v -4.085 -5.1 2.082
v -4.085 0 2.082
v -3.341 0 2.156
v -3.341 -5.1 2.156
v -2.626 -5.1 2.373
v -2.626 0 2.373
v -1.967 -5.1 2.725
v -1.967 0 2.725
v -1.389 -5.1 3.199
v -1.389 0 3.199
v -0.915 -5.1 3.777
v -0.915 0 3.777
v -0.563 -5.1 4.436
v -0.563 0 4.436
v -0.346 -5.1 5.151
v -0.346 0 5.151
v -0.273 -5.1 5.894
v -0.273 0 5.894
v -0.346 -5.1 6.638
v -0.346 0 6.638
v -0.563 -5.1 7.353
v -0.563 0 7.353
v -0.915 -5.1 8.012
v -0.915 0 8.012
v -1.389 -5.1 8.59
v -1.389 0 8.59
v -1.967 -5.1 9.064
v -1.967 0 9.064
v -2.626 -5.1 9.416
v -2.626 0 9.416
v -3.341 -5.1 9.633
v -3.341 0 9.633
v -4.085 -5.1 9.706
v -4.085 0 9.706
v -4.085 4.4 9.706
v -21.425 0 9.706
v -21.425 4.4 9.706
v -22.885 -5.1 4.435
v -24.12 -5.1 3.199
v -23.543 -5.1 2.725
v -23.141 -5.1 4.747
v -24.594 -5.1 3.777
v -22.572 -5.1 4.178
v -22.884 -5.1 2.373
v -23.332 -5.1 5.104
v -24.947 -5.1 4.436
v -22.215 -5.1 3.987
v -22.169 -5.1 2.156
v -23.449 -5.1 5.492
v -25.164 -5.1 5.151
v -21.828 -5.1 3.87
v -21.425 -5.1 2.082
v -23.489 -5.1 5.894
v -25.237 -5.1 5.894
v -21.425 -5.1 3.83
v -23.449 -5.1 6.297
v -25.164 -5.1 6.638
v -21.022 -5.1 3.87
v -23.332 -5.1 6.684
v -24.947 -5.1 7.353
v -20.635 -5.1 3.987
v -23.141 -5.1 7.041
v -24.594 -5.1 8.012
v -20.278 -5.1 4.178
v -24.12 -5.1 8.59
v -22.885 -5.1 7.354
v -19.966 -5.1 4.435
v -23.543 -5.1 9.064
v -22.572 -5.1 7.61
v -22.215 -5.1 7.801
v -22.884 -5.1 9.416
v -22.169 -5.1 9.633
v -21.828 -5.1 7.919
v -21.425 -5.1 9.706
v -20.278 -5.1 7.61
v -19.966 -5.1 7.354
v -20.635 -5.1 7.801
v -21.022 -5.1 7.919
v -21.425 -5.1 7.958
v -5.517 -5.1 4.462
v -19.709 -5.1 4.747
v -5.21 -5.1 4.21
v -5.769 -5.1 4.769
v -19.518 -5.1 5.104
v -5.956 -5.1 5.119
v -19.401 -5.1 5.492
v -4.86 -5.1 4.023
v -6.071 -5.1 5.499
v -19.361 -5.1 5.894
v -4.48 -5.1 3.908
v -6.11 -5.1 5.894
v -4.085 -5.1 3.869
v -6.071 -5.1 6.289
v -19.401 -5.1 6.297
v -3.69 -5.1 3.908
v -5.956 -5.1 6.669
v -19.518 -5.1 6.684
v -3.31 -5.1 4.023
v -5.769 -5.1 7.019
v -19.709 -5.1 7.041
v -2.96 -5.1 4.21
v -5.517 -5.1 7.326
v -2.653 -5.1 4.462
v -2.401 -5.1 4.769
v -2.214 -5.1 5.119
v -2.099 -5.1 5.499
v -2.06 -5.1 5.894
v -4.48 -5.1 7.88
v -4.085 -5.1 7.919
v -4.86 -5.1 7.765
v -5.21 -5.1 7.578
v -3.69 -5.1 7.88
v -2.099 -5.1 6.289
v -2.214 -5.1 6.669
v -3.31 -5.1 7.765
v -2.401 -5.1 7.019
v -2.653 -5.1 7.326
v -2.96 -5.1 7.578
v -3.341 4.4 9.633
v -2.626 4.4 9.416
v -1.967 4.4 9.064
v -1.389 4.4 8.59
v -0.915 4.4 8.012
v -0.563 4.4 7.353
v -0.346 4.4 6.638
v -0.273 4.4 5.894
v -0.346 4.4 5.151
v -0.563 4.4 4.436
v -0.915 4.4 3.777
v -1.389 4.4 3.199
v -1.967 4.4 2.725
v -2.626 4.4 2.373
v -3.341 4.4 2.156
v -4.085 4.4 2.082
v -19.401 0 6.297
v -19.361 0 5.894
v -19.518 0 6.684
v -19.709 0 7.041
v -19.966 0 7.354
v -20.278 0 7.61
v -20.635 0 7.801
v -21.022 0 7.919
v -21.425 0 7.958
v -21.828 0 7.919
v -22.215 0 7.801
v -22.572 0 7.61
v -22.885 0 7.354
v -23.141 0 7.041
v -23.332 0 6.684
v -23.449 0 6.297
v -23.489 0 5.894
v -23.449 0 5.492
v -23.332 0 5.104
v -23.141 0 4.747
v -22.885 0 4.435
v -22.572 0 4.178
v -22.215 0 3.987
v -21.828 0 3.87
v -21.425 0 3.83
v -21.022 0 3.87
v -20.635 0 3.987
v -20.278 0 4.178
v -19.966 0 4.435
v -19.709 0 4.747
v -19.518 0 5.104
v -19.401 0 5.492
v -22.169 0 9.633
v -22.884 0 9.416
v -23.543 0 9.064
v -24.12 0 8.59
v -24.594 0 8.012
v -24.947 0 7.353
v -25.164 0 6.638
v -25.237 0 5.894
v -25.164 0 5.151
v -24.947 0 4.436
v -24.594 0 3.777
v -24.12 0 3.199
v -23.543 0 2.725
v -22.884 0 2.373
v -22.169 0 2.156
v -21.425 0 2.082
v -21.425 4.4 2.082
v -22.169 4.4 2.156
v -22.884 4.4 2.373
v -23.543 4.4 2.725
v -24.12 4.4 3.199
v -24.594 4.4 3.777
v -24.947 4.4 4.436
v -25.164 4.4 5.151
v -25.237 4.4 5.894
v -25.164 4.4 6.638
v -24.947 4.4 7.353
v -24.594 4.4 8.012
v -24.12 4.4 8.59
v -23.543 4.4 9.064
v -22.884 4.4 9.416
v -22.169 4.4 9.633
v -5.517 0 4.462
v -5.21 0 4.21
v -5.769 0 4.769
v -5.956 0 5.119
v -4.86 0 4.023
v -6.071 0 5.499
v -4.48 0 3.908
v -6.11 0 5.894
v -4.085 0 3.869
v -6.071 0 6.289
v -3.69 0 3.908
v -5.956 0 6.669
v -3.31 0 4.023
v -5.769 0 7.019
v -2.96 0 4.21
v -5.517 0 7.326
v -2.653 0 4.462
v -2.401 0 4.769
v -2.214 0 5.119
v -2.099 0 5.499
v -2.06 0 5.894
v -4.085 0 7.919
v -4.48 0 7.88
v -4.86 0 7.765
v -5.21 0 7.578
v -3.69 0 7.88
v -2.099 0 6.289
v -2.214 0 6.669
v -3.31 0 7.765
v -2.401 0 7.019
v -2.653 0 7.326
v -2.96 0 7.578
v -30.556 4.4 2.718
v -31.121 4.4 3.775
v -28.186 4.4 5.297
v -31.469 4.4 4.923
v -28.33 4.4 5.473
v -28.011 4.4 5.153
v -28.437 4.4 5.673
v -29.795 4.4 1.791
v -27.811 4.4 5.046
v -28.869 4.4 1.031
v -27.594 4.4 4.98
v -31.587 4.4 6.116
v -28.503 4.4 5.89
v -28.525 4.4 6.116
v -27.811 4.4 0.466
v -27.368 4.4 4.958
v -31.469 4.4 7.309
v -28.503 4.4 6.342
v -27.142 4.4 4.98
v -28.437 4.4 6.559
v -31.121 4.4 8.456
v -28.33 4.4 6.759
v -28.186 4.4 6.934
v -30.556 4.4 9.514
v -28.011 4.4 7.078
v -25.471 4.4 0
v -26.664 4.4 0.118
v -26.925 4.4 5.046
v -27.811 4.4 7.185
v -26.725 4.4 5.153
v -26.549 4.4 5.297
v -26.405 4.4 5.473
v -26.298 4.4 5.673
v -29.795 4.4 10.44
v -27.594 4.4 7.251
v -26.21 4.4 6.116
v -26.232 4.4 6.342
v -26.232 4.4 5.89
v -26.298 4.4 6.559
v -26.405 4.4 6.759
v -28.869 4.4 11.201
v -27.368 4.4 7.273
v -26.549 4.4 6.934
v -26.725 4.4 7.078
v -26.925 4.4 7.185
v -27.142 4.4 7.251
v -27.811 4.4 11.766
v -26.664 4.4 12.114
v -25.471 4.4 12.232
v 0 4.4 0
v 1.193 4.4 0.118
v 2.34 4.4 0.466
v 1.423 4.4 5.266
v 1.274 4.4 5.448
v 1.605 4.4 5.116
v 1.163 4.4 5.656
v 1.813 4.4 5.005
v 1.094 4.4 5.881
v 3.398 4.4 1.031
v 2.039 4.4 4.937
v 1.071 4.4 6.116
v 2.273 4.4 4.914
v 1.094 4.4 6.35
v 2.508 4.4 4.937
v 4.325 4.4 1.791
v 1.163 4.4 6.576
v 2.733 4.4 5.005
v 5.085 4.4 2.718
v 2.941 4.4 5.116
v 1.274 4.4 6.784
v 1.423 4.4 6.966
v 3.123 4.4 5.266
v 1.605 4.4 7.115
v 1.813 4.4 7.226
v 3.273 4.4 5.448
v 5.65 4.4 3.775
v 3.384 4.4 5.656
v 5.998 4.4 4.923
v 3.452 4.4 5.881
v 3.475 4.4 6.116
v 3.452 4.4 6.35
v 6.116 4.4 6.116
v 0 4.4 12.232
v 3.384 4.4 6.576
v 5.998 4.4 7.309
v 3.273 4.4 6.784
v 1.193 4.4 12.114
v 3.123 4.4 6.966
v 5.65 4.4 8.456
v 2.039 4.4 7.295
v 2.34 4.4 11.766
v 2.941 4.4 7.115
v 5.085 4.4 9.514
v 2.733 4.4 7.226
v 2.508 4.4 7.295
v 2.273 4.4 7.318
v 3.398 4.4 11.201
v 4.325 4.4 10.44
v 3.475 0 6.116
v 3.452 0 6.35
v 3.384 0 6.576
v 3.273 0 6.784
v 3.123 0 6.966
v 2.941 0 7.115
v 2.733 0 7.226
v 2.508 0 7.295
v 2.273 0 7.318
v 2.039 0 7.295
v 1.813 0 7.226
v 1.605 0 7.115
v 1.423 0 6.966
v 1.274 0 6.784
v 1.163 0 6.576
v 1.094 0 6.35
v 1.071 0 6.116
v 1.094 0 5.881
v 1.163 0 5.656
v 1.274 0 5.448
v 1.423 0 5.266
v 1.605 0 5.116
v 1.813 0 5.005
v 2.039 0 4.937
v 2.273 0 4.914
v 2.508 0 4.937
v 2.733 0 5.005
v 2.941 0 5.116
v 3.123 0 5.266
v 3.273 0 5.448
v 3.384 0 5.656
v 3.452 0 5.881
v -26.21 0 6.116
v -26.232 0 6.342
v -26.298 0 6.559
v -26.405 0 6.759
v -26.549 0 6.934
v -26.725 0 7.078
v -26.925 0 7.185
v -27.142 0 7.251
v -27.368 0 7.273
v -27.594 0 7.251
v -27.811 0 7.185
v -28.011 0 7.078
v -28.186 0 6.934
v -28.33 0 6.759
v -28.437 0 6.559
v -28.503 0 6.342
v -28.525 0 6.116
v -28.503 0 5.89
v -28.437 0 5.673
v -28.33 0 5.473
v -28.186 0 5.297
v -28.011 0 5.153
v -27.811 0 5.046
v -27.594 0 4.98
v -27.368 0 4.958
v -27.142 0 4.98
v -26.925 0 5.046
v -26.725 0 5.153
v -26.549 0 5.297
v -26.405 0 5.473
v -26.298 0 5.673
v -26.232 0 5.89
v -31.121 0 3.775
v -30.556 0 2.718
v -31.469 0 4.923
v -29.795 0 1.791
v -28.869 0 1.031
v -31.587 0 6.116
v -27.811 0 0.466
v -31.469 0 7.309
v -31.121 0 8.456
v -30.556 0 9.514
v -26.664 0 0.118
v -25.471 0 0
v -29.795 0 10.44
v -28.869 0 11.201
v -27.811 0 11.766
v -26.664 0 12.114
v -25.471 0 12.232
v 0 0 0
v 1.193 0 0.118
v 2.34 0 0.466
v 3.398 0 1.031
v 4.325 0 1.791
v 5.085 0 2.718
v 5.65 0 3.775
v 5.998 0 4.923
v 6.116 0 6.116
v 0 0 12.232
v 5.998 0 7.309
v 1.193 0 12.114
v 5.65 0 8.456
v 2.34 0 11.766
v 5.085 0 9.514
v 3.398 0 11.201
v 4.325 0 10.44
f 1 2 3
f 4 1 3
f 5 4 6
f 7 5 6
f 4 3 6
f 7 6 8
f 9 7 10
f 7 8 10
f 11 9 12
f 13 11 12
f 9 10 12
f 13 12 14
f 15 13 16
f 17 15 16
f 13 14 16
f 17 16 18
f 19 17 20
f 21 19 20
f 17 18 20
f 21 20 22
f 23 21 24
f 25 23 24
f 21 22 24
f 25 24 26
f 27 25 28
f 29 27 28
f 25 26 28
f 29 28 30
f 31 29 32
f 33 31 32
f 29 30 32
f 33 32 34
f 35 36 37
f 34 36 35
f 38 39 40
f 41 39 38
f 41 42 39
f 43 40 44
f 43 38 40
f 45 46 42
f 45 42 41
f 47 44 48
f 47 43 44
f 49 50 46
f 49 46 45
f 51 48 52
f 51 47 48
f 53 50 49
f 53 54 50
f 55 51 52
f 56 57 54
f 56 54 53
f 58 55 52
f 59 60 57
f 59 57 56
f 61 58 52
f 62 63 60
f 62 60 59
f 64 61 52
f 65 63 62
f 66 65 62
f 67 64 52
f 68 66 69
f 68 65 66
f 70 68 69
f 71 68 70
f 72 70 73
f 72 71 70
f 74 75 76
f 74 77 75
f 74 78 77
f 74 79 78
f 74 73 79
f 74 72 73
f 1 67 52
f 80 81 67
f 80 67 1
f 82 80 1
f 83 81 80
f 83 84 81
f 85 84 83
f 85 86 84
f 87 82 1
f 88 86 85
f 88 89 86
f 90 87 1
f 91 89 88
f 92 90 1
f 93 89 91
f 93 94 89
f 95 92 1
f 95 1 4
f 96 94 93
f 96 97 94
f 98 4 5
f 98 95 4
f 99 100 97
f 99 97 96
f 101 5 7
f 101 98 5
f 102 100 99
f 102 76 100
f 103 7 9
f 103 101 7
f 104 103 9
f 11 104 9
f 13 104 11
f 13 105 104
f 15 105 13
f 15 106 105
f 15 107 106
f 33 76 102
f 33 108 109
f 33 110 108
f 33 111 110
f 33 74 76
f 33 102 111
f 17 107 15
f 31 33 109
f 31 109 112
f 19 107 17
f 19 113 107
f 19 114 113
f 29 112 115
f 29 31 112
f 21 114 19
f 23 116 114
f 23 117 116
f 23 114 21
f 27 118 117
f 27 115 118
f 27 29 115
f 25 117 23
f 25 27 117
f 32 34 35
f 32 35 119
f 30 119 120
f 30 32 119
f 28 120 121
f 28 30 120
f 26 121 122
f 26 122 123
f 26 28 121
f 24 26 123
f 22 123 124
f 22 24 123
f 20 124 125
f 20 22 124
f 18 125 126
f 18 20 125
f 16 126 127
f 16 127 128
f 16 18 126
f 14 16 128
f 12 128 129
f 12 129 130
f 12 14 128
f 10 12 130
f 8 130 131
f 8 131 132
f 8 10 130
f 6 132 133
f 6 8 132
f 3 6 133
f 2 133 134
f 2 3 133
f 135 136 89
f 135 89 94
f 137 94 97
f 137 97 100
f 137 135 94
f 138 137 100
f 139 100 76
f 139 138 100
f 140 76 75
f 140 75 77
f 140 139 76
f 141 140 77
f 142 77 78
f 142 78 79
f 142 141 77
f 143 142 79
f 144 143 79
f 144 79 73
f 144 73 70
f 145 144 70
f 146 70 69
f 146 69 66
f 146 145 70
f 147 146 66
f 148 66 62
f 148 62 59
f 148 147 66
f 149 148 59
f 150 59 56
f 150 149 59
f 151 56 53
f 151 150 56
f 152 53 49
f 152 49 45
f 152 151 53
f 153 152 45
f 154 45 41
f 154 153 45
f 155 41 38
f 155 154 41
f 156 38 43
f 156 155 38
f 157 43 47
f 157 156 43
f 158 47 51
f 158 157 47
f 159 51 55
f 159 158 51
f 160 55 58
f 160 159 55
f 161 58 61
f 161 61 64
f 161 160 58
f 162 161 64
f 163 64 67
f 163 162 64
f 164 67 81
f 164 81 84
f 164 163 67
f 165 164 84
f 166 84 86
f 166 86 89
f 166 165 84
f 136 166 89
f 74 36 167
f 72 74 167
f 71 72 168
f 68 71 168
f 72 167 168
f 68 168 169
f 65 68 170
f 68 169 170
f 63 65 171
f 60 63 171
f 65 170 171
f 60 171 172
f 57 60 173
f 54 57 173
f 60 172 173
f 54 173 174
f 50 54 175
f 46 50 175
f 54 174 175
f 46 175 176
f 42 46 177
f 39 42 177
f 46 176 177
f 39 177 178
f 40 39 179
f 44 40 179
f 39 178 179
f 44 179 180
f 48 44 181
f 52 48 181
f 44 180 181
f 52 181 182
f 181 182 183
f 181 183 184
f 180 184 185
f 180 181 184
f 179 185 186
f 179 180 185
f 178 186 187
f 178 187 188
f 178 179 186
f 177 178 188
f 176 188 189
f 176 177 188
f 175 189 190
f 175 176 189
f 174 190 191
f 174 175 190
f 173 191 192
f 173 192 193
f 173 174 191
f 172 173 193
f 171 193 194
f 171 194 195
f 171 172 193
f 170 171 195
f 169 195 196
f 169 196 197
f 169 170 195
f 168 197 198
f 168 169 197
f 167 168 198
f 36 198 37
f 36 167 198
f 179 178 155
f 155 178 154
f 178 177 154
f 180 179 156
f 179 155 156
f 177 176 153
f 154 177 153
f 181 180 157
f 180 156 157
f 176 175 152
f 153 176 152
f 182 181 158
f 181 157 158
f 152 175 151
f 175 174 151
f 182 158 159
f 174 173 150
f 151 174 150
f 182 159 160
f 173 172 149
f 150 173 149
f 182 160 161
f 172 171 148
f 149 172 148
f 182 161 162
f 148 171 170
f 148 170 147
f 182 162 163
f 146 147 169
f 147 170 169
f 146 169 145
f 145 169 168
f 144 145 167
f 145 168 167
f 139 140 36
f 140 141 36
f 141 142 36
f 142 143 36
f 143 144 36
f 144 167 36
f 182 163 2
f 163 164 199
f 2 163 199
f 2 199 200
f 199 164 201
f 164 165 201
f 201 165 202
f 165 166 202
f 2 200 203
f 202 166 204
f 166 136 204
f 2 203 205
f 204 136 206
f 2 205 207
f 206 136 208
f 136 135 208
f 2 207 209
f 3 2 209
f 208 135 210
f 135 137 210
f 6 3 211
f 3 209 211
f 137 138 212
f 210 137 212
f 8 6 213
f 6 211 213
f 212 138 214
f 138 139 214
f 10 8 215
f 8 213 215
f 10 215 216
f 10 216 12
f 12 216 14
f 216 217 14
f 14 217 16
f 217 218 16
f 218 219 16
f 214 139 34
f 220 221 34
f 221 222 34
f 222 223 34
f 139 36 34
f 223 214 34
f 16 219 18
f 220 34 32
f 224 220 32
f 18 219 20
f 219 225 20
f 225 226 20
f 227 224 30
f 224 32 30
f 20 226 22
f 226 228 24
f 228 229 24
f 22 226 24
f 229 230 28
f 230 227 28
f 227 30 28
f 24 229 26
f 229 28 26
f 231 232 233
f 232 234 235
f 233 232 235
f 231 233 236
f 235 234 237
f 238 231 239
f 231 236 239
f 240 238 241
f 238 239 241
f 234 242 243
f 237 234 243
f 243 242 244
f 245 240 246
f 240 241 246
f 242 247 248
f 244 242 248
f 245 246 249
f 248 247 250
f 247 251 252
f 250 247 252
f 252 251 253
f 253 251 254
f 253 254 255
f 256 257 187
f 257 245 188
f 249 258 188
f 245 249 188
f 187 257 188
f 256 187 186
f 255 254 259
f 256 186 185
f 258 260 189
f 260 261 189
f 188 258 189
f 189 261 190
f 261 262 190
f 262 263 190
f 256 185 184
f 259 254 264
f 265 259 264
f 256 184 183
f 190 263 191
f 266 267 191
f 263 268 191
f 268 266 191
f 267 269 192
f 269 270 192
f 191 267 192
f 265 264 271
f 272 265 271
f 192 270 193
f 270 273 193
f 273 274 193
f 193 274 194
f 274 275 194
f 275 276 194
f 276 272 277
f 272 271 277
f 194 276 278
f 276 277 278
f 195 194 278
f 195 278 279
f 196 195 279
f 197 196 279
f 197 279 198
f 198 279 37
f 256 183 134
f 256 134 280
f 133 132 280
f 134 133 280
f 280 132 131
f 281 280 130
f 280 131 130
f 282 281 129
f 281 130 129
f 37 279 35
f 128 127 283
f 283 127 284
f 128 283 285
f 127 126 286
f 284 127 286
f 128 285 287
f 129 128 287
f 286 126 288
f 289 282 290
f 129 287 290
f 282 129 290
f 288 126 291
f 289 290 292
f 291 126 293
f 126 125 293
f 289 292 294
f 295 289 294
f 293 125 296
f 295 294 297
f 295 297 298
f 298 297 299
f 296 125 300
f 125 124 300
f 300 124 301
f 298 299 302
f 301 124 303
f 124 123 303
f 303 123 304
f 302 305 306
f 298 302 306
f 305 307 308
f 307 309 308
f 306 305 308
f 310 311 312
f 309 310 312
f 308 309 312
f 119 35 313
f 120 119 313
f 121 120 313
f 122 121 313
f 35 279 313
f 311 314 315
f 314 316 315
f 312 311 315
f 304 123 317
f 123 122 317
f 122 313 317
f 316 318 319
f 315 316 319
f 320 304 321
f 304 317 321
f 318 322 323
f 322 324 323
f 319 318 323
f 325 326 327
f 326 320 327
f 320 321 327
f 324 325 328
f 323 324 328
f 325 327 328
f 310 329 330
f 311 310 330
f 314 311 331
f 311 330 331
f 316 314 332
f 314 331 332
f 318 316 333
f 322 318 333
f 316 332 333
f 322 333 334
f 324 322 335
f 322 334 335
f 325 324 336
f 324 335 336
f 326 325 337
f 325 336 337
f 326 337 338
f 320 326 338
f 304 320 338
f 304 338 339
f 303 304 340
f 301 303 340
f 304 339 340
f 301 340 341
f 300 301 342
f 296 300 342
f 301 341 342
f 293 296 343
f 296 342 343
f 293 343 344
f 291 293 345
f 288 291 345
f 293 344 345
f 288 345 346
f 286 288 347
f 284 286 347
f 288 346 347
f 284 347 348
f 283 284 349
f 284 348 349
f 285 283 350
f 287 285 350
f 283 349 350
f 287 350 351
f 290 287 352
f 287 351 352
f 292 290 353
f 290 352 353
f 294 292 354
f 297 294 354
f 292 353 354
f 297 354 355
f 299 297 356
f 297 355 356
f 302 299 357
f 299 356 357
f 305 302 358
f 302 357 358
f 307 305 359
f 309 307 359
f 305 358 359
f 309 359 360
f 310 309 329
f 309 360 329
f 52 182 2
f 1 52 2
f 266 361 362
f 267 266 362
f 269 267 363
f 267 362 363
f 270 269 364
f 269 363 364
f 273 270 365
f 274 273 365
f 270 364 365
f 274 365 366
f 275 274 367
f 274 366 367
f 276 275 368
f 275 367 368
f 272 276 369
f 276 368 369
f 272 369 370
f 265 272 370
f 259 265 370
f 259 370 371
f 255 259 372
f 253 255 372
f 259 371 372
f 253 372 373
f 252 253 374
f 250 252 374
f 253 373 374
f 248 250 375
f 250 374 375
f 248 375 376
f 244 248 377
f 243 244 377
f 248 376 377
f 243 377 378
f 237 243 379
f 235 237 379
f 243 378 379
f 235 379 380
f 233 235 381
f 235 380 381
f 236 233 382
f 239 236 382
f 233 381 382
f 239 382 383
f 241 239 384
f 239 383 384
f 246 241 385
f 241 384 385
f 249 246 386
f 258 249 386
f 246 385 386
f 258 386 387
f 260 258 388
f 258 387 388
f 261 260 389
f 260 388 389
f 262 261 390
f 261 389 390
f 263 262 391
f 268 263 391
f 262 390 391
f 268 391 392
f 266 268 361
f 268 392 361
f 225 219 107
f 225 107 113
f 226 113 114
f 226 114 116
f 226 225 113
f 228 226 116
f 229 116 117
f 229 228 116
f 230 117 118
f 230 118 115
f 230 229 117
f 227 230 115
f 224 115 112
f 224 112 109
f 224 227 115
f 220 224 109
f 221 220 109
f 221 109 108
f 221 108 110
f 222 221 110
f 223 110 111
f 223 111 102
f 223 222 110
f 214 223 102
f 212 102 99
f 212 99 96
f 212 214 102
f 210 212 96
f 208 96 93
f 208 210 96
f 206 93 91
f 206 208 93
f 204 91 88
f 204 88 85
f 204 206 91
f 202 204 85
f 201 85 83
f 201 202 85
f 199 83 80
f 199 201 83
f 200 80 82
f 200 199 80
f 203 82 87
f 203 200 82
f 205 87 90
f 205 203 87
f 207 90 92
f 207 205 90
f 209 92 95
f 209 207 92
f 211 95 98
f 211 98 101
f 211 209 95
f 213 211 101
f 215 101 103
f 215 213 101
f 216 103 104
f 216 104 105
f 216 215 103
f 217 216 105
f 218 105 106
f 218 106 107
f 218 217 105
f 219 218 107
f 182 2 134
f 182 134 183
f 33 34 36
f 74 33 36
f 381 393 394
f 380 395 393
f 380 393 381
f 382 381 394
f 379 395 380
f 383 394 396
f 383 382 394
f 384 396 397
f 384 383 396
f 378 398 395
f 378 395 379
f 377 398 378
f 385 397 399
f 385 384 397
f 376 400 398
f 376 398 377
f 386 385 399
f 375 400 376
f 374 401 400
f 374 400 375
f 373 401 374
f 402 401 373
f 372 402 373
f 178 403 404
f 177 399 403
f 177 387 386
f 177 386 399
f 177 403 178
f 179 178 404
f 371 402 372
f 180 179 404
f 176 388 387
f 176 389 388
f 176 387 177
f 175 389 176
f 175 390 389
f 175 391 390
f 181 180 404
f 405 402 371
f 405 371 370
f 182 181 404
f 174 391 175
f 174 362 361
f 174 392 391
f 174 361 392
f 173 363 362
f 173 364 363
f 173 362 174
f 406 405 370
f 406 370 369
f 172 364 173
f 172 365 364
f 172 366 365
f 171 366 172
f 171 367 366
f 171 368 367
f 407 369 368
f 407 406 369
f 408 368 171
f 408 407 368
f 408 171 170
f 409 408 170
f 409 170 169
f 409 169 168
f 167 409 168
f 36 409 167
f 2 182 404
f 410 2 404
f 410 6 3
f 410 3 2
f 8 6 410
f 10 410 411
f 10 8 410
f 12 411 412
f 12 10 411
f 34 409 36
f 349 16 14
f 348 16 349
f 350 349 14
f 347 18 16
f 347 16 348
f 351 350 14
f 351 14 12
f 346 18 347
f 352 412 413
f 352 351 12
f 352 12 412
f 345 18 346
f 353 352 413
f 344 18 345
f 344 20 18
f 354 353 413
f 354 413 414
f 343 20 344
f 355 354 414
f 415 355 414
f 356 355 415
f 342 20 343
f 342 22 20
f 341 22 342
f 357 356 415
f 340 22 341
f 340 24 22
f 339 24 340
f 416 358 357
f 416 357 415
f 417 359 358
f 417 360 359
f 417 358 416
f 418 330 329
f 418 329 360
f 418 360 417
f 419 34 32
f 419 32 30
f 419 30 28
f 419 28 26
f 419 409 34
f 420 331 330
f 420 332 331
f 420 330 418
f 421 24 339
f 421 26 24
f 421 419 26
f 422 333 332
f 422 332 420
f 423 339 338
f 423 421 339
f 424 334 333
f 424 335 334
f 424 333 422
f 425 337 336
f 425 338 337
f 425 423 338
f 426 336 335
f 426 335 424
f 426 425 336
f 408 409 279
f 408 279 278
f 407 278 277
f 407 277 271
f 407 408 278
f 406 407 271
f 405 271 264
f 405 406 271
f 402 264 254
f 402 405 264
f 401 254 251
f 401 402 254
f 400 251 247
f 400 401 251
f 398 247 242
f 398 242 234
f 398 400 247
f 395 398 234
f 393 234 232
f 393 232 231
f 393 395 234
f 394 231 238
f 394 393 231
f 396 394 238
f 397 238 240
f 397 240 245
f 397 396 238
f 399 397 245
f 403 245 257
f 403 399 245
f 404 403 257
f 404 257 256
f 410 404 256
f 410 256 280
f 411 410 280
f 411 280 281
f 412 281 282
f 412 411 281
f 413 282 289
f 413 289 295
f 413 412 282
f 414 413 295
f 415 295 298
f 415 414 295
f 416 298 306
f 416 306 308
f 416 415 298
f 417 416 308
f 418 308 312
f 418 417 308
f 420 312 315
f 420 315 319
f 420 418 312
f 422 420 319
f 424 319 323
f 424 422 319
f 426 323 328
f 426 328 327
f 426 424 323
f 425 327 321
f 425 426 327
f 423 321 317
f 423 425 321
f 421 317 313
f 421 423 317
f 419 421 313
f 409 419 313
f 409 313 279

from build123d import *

# Parameters (mm, degrees)
F0_R     = 1.157623
F0_R_2   = 1.202078
F1_DEPTH = 4.4
F0_R_3   = 2.064031
F0_R_4   = 2.025122
F2_DEPTH = 5.1


with BuildPart() as f1:
    # F0 (on Front) → F1 (new body)
    with BuildSketch(Plane.XZ):
        with BuildLine():
            Line((-25.47081, 0), (0, 0))
            ThreePointArc((0, 0), (6.115872, 6.115872), (0, 12.231745))
            Line((0, 12.231745), (-25.47081, 12.231745))
            ThreePointArc((-25.47081, 12.231745), (-31.586682, 6.115872), (-25.47081, 0))
        make_face()
        with Locations((-27.367856, 6.115872)):
            Circle(F0_R, mode=Mode.SUBTRACT)
        with BuildLine():
            Line((-4.08474, 2.082464), (-21.425037, 2.082464))
            ThreePointArc((-21.425037, 2.082464), (-25.236771, 5.894198), (-21.425037, 9.705932))
            Line((-21.425037, 9.705932), (-4.08474, 9.705932))
            ThreePointArc((-4.08474, 9.705932), (-0.273006, 5.894198), (-4.08474, 2.082464))
        make_face(mode=Mode.SUBTRACT)
        with Locations((2.273161, 6.115872)):
            Circle(F0_R_2, mode=Mode.SUBTRACT)
    extrude(amount=-F1_DEPTH)


with BuildPart() as f2:
    # F0 (on Front) → F2 (new body)
    with BuildSketch(Plane.XZ):
        with BuildLine():
            ThreePointArc((-21.425037, 9.705932), (-25.236771, 5.894198), (-21.425037, 2.082464))
            Line((-21.425037, 2.082464), (-4.08474, 2.082464))
            ThreePointArc((-4.08474, 2.082464), (-0.273006, 5.894198), (-4.08474, 9.705932))
            Line((-4.08474, 9.705932), (-21.425037, 9.705932))
        make_face()
        with Locations((-21.425037, 5.894198)):
            Circle(F0_R_3, mode=Mode.SUBTRACT)
        with Locations((-4.08474, 5.894198)):
            Circle(F0_R_4, mode=Mode.SUBTRACT)
    extrude(amount=F2_DEPTH)


solid = Compound([f1.part, f2.part])
